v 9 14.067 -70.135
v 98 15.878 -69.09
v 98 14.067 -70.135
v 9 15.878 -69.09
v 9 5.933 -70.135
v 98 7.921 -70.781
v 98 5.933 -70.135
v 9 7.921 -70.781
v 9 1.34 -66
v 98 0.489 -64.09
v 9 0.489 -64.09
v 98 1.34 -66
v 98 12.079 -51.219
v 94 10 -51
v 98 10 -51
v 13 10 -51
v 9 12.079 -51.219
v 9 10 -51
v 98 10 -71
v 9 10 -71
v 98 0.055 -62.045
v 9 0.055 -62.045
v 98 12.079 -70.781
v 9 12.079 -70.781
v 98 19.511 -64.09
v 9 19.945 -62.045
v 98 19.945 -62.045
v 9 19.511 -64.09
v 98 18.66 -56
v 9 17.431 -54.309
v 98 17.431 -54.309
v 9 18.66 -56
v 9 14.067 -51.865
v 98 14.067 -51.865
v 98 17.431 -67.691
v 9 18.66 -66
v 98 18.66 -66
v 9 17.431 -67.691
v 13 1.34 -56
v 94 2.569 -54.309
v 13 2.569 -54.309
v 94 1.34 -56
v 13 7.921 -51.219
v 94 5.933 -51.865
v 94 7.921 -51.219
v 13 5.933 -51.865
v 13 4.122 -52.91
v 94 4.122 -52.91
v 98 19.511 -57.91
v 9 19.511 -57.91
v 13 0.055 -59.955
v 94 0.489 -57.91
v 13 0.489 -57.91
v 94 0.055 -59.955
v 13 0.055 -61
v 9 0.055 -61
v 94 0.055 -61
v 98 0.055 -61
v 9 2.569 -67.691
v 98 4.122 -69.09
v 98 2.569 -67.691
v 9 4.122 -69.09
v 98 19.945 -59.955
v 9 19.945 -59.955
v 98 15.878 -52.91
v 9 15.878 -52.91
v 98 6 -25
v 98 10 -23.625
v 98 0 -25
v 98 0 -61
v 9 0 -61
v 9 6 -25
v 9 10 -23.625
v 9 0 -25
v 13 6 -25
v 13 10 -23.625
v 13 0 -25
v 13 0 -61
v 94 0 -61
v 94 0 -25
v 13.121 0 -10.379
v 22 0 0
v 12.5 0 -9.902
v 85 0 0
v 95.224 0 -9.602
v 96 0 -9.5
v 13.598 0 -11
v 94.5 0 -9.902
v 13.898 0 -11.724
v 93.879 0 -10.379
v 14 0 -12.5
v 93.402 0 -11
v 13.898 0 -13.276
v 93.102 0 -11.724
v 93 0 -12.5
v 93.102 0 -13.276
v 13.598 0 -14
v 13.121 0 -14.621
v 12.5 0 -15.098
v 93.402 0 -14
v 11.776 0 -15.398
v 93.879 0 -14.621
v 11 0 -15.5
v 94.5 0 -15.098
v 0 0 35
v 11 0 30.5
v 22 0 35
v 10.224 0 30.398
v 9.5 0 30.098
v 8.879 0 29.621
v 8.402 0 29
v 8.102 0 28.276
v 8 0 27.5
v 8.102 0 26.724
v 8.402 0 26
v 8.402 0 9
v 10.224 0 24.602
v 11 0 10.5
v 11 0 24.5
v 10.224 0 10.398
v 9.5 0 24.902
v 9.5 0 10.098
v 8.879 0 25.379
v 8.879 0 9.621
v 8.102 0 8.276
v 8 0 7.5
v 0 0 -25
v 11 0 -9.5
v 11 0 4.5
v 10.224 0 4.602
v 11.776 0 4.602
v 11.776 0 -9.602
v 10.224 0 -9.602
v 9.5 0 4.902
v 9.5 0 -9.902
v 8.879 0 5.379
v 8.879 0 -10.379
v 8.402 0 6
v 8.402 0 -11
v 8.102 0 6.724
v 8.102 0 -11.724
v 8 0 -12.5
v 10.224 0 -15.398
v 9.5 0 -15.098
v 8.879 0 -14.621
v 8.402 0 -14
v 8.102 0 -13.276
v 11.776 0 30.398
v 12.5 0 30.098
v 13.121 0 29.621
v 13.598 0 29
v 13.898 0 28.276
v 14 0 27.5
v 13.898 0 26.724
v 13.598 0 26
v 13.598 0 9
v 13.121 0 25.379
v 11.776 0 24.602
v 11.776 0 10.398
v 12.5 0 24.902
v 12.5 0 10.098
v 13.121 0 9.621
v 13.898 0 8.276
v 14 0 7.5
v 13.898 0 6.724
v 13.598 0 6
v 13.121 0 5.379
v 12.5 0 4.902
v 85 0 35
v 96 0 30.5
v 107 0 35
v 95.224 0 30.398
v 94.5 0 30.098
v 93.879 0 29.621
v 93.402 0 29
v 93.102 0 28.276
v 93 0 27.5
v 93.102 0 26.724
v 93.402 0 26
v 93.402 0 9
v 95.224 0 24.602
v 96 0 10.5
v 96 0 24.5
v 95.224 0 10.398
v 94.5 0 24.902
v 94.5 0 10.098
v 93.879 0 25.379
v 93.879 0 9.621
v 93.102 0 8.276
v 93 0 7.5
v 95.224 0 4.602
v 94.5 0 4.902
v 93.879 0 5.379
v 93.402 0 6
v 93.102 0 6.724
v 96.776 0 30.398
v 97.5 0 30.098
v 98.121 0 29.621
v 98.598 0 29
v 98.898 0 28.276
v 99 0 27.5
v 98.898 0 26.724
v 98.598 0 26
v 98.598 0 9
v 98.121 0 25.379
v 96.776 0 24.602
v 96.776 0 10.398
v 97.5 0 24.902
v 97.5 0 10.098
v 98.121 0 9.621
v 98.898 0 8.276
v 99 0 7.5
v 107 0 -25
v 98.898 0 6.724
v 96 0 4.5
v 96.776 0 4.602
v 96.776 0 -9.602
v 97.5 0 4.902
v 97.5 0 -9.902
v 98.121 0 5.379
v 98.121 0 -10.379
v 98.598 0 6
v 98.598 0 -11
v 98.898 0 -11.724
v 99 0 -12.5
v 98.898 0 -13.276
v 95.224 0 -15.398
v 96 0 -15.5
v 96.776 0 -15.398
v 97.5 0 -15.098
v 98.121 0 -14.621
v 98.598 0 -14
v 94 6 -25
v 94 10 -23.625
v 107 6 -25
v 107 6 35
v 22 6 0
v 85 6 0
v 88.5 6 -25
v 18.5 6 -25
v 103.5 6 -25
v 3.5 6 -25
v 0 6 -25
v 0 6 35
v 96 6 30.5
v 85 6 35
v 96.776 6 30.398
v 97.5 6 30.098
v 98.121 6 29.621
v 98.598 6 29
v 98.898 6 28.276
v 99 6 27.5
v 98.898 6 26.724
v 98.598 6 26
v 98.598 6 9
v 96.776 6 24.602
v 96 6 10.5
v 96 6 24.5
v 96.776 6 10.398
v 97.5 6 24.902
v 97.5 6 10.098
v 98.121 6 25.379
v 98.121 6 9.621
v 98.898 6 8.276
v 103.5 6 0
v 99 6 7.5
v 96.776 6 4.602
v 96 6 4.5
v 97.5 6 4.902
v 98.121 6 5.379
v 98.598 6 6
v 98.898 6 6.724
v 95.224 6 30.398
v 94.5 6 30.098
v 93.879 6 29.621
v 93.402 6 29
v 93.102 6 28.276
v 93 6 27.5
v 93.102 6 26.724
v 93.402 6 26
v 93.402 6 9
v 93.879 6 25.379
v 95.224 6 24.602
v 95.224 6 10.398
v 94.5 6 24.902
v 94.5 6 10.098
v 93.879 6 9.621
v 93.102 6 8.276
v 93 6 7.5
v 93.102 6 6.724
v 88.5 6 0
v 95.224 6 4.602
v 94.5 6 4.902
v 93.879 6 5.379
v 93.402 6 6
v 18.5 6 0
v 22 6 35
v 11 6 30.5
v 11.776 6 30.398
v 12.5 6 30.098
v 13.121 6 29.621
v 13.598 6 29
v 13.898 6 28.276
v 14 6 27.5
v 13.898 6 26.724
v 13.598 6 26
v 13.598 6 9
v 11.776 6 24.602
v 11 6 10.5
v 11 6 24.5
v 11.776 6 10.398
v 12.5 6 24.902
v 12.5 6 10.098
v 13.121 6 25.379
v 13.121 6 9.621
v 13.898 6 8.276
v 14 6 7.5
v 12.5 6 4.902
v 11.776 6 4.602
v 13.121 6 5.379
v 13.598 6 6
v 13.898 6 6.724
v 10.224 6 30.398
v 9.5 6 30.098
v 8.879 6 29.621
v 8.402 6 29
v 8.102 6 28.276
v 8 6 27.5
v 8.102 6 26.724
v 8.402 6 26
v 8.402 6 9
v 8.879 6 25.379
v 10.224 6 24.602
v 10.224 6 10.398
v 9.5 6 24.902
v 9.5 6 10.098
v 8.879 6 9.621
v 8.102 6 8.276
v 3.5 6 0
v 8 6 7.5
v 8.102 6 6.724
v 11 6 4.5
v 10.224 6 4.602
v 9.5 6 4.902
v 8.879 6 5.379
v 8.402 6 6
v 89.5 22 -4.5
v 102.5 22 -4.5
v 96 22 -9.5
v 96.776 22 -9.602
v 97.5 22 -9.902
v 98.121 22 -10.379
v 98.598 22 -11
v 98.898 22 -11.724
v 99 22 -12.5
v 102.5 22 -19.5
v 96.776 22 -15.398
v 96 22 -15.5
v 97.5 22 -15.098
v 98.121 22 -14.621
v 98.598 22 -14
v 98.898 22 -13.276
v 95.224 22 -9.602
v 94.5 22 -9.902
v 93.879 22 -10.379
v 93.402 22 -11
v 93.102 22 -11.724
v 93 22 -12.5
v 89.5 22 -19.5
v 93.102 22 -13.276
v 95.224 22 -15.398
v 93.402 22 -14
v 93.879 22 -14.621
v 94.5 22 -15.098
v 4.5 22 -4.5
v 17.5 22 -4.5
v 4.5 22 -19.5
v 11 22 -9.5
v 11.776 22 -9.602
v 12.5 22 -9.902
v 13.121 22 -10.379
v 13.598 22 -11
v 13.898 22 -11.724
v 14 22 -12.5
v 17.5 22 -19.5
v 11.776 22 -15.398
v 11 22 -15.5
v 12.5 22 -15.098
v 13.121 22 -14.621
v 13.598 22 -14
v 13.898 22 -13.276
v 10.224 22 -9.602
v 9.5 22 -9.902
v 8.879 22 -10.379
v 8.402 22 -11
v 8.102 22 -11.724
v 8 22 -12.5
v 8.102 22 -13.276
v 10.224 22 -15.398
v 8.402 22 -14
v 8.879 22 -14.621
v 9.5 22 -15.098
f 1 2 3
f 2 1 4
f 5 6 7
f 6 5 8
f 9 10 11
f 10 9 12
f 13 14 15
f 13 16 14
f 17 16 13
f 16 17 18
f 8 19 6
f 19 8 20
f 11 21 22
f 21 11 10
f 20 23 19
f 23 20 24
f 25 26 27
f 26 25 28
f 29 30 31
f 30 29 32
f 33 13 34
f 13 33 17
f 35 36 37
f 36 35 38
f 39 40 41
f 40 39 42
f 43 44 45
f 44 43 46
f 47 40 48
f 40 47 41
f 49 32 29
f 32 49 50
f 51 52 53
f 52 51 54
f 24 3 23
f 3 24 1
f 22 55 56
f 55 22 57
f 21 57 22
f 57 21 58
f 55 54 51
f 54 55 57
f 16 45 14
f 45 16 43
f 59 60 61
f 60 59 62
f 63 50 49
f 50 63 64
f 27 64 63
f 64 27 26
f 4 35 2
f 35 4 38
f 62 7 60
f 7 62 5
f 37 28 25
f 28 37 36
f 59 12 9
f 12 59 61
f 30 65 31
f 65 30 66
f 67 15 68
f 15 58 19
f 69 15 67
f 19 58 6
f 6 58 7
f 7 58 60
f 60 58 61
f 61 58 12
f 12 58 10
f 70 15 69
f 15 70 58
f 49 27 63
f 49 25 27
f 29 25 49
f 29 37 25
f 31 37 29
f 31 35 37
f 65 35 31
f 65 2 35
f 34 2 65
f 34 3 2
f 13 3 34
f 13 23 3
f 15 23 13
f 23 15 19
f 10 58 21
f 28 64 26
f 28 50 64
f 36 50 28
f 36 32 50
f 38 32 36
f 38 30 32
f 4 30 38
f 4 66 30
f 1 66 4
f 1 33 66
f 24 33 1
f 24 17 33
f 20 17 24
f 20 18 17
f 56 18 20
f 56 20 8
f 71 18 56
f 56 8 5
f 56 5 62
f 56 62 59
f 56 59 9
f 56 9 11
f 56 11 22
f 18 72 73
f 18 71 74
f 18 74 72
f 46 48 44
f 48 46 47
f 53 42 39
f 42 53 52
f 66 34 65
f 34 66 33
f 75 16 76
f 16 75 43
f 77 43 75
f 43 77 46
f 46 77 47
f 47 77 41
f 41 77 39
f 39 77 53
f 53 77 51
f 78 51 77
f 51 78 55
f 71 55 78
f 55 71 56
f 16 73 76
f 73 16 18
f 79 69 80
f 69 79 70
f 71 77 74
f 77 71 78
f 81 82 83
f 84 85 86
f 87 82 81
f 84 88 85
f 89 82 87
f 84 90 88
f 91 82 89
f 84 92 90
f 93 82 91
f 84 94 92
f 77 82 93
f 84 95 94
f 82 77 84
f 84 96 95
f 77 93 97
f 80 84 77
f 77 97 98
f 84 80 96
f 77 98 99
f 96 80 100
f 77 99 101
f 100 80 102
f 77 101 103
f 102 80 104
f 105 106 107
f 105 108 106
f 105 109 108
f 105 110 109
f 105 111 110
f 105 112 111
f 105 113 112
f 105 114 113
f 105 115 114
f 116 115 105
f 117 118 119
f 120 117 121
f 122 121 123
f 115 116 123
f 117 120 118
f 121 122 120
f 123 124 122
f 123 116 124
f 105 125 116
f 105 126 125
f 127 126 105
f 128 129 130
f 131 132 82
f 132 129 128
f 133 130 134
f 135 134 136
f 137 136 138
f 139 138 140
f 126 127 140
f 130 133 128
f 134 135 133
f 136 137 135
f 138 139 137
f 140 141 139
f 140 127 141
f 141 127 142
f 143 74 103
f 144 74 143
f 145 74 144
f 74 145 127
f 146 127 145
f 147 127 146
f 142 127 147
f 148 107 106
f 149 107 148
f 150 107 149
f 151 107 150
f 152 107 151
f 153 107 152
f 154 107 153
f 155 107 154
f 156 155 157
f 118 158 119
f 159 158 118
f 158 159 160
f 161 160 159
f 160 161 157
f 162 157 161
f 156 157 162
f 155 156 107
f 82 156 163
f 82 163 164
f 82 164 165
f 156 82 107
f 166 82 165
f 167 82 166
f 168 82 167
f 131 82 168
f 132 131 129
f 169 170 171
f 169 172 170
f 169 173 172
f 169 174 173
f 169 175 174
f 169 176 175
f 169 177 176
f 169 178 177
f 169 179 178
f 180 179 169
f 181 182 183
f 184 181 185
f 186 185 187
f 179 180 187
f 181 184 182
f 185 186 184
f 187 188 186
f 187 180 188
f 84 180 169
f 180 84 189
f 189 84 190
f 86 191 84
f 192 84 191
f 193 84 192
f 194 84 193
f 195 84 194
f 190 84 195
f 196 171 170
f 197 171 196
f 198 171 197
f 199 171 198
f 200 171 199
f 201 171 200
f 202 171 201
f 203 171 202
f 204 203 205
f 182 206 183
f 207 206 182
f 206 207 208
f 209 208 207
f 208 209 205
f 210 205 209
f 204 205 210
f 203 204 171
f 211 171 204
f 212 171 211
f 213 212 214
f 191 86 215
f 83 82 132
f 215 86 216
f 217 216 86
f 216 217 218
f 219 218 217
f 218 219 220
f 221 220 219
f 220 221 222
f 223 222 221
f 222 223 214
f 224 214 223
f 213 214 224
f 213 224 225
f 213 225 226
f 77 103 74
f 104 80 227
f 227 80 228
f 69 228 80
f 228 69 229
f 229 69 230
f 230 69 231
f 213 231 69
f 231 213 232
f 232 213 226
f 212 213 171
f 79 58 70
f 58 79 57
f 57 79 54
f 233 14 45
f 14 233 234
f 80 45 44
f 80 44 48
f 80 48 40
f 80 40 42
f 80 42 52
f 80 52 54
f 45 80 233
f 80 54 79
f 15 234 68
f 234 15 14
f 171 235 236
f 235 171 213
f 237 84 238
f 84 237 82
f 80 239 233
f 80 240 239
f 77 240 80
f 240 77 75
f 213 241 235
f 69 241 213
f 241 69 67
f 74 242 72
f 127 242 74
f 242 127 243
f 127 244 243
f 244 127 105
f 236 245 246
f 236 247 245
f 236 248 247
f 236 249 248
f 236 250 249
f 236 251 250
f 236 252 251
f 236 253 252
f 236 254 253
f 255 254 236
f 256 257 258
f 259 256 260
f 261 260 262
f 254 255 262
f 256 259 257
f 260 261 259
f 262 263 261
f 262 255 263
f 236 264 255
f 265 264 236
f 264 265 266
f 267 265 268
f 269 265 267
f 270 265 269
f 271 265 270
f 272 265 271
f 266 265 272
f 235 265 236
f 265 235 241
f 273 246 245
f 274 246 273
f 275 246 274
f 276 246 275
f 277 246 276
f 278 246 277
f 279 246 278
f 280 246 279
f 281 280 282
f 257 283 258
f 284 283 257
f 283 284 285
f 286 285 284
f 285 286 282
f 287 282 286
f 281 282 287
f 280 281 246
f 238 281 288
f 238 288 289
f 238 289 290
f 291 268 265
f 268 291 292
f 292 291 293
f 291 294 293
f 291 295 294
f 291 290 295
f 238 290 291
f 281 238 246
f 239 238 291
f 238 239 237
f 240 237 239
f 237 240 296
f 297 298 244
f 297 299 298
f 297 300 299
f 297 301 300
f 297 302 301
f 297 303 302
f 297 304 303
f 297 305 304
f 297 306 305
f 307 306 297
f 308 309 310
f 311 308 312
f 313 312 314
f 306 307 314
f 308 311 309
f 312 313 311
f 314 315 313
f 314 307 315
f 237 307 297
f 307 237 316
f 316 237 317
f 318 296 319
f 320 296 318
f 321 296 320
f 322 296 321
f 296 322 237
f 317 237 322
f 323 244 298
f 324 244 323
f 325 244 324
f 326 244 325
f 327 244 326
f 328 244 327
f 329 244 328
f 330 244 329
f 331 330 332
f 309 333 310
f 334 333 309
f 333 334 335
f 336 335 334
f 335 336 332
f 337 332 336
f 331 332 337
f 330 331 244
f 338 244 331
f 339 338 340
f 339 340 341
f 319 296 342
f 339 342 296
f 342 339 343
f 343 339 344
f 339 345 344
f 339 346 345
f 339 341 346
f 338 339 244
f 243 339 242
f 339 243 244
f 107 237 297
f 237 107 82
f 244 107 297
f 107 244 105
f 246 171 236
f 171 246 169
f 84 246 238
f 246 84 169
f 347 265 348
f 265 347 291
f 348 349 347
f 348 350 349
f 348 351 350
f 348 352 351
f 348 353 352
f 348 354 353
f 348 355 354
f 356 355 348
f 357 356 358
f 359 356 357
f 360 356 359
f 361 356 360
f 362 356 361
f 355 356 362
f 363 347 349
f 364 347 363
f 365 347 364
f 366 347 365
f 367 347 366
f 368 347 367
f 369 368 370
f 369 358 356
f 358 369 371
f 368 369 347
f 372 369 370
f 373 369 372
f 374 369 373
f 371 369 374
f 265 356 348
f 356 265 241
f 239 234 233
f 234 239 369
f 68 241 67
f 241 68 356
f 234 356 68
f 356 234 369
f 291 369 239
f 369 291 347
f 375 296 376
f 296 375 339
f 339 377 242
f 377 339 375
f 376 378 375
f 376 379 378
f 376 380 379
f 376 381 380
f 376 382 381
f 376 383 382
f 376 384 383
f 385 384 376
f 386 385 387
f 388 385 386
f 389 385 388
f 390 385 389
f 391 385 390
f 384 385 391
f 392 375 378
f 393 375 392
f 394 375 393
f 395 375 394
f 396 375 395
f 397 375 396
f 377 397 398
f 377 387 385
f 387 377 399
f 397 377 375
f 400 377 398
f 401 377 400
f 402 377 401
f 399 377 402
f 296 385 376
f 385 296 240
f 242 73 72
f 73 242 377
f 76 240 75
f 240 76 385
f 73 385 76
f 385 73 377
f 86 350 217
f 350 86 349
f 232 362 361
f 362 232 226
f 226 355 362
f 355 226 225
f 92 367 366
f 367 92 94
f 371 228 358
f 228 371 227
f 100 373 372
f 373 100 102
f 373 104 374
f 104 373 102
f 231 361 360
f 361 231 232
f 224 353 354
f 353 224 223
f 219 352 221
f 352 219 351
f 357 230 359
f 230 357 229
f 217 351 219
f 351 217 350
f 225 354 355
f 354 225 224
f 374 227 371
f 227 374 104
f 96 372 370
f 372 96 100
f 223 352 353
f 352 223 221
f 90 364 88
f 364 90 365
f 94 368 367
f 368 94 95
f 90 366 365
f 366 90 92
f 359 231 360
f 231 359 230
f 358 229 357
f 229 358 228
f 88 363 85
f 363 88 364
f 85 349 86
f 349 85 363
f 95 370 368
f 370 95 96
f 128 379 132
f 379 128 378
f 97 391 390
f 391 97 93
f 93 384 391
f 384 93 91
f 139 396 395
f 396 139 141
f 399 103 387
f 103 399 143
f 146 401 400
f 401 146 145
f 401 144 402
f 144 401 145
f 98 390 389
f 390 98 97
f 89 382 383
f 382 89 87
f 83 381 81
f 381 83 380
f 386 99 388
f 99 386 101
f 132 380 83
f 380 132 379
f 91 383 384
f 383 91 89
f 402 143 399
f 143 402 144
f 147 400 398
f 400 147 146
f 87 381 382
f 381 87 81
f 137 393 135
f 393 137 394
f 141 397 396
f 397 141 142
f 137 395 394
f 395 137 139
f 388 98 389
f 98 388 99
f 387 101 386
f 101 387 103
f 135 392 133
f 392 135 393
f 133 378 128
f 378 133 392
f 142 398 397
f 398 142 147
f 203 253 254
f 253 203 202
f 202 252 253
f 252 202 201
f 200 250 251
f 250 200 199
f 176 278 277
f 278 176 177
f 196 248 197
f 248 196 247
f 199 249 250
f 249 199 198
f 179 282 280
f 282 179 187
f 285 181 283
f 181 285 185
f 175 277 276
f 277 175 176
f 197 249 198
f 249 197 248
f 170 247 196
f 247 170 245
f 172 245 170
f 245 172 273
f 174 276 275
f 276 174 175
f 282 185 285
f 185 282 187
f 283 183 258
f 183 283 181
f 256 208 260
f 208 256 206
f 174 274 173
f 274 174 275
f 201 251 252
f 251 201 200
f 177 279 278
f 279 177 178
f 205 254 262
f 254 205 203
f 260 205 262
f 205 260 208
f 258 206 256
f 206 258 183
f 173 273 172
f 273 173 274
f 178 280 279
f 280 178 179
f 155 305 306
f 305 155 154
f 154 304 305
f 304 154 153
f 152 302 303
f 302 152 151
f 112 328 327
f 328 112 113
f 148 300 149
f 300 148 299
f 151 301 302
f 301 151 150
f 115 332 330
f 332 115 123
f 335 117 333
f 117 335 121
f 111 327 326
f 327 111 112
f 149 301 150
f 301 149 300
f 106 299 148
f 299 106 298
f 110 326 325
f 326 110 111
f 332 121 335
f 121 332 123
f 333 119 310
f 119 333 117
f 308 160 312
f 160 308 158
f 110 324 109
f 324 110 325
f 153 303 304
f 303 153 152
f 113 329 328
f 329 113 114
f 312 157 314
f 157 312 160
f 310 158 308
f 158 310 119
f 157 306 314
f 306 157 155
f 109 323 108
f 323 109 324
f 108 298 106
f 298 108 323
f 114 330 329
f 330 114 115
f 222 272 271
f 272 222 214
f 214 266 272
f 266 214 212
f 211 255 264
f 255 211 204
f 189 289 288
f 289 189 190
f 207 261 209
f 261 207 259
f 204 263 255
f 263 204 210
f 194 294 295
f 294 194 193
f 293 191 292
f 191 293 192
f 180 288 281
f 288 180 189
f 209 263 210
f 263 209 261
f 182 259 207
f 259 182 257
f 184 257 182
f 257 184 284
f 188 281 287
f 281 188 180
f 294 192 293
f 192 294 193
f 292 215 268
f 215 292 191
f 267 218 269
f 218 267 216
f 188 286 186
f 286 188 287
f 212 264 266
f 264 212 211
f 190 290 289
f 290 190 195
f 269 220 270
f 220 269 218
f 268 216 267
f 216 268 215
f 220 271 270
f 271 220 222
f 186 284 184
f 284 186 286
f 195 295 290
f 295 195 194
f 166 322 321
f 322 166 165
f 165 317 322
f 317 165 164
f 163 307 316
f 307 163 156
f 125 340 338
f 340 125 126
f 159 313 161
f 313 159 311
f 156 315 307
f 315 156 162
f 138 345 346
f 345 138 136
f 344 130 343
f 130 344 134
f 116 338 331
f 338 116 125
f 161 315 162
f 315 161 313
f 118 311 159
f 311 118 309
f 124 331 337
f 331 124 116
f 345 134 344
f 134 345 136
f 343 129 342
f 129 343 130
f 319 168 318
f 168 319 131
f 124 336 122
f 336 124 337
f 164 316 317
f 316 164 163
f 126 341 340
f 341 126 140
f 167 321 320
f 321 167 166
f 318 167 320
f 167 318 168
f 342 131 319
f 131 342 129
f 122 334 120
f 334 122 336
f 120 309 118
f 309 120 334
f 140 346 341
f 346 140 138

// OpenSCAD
stud_d=6;
stud_h=60;
stud_w=22;
base_d=6;
base_h=25;
stud_distance=90;



extension_d=22;
extension_h=base_h;
extension_w=15;
hole_distance=85;
hole_dia=6;
head_dia=10;
//head_d=6;

base_w=hole_distance+stud_w;

screw_length=21;

lightbar_dia=20;
lightbar_elevation=26;
lightbar_stand_w=4;
lightbar_stand_d=10;

module lightbar() {
  translate([0.5*(stud_w)-0.5*lightbar_stand_w, 0.5*lightbar_dia, 0])    
    rotate([0, 90, 0]) cylinder(h=hole_distance+lightbar_stand_w, d=lightbar_dia);
  translate([0.5*(stud_w)-0.5*lightbar_stand_w, 0, 0])  
    cube([lightbar_stand_w, lightbar_stand_d, lightbar_elevation+0.5*(lightbar_dia+extension_h)]);
  translate([0.5*(stud_w-lightbar_stand_w)+hole_distance, 0, 0])  
    cube([lightbar_stand_w, lightbar_stand_d, lightbar_elevation+0.5*(lightbar_dia+extension_h)]);
}

module stud() {
  cube([stud_w, stud_d, stud_h]);


}

module extension() {
  //cube([extension_w, extension_d, extension_h]);
  //cube([0.5*extension_w, extension_d, 0.5*extension_h]);
  hull() {
    cube([extension_w, base_d, extension_h]);
  translate([1, extension_d-base_d, 0.5*extension_w-2]) cube([extension_w-2, base_d, extension_w]);
  }
}

module screw_hole() {
  $fn=24;
  hole_needed=base_d+extension_d;
  head_d = hole_needed - screw_length;
    translate([0.5*base_w, 0, -0.5*base_h])
    rotate([-90, 0, 0]) {
        cylinder(h=base_d+extension_d, d=hole_dia);
        //cylinder(h=head_d, d=head_dia);
    }
}

module base() {
  cube([base_w, base_d, base_h]);
  stud();
  translate([base_w-stud_w, 0, 0]) stud();

    translate([0.5*(base_w-extension_w+hole_distance), 0, 0]) extension();
  translate([0.5*(base_w-extension_w-hole_distance), 0, 0]) extension();
    
    
    translate([0, 0, -(lightbar_elevation+0.5*lightbar_dia)])
  lightbar();
}

difference() {
  translate([0, 0, -base_h]) base();
  translate([0.5*hole_distance, 0, 0]) screw_hole();
  translate([-0.5*hole_distance, 0, 0]) screw_hole();
  translate([0.5*hole_distance, 0, 40]) screw_hole();
  translate([-0.5*hole_distance, 0, 40]) screw_hole();
  translate([0.5*hole_distance, 0, 20]) screw_hole();
  translate([-0.5*hole_distance, 0, 20]) screw_hole();
}
